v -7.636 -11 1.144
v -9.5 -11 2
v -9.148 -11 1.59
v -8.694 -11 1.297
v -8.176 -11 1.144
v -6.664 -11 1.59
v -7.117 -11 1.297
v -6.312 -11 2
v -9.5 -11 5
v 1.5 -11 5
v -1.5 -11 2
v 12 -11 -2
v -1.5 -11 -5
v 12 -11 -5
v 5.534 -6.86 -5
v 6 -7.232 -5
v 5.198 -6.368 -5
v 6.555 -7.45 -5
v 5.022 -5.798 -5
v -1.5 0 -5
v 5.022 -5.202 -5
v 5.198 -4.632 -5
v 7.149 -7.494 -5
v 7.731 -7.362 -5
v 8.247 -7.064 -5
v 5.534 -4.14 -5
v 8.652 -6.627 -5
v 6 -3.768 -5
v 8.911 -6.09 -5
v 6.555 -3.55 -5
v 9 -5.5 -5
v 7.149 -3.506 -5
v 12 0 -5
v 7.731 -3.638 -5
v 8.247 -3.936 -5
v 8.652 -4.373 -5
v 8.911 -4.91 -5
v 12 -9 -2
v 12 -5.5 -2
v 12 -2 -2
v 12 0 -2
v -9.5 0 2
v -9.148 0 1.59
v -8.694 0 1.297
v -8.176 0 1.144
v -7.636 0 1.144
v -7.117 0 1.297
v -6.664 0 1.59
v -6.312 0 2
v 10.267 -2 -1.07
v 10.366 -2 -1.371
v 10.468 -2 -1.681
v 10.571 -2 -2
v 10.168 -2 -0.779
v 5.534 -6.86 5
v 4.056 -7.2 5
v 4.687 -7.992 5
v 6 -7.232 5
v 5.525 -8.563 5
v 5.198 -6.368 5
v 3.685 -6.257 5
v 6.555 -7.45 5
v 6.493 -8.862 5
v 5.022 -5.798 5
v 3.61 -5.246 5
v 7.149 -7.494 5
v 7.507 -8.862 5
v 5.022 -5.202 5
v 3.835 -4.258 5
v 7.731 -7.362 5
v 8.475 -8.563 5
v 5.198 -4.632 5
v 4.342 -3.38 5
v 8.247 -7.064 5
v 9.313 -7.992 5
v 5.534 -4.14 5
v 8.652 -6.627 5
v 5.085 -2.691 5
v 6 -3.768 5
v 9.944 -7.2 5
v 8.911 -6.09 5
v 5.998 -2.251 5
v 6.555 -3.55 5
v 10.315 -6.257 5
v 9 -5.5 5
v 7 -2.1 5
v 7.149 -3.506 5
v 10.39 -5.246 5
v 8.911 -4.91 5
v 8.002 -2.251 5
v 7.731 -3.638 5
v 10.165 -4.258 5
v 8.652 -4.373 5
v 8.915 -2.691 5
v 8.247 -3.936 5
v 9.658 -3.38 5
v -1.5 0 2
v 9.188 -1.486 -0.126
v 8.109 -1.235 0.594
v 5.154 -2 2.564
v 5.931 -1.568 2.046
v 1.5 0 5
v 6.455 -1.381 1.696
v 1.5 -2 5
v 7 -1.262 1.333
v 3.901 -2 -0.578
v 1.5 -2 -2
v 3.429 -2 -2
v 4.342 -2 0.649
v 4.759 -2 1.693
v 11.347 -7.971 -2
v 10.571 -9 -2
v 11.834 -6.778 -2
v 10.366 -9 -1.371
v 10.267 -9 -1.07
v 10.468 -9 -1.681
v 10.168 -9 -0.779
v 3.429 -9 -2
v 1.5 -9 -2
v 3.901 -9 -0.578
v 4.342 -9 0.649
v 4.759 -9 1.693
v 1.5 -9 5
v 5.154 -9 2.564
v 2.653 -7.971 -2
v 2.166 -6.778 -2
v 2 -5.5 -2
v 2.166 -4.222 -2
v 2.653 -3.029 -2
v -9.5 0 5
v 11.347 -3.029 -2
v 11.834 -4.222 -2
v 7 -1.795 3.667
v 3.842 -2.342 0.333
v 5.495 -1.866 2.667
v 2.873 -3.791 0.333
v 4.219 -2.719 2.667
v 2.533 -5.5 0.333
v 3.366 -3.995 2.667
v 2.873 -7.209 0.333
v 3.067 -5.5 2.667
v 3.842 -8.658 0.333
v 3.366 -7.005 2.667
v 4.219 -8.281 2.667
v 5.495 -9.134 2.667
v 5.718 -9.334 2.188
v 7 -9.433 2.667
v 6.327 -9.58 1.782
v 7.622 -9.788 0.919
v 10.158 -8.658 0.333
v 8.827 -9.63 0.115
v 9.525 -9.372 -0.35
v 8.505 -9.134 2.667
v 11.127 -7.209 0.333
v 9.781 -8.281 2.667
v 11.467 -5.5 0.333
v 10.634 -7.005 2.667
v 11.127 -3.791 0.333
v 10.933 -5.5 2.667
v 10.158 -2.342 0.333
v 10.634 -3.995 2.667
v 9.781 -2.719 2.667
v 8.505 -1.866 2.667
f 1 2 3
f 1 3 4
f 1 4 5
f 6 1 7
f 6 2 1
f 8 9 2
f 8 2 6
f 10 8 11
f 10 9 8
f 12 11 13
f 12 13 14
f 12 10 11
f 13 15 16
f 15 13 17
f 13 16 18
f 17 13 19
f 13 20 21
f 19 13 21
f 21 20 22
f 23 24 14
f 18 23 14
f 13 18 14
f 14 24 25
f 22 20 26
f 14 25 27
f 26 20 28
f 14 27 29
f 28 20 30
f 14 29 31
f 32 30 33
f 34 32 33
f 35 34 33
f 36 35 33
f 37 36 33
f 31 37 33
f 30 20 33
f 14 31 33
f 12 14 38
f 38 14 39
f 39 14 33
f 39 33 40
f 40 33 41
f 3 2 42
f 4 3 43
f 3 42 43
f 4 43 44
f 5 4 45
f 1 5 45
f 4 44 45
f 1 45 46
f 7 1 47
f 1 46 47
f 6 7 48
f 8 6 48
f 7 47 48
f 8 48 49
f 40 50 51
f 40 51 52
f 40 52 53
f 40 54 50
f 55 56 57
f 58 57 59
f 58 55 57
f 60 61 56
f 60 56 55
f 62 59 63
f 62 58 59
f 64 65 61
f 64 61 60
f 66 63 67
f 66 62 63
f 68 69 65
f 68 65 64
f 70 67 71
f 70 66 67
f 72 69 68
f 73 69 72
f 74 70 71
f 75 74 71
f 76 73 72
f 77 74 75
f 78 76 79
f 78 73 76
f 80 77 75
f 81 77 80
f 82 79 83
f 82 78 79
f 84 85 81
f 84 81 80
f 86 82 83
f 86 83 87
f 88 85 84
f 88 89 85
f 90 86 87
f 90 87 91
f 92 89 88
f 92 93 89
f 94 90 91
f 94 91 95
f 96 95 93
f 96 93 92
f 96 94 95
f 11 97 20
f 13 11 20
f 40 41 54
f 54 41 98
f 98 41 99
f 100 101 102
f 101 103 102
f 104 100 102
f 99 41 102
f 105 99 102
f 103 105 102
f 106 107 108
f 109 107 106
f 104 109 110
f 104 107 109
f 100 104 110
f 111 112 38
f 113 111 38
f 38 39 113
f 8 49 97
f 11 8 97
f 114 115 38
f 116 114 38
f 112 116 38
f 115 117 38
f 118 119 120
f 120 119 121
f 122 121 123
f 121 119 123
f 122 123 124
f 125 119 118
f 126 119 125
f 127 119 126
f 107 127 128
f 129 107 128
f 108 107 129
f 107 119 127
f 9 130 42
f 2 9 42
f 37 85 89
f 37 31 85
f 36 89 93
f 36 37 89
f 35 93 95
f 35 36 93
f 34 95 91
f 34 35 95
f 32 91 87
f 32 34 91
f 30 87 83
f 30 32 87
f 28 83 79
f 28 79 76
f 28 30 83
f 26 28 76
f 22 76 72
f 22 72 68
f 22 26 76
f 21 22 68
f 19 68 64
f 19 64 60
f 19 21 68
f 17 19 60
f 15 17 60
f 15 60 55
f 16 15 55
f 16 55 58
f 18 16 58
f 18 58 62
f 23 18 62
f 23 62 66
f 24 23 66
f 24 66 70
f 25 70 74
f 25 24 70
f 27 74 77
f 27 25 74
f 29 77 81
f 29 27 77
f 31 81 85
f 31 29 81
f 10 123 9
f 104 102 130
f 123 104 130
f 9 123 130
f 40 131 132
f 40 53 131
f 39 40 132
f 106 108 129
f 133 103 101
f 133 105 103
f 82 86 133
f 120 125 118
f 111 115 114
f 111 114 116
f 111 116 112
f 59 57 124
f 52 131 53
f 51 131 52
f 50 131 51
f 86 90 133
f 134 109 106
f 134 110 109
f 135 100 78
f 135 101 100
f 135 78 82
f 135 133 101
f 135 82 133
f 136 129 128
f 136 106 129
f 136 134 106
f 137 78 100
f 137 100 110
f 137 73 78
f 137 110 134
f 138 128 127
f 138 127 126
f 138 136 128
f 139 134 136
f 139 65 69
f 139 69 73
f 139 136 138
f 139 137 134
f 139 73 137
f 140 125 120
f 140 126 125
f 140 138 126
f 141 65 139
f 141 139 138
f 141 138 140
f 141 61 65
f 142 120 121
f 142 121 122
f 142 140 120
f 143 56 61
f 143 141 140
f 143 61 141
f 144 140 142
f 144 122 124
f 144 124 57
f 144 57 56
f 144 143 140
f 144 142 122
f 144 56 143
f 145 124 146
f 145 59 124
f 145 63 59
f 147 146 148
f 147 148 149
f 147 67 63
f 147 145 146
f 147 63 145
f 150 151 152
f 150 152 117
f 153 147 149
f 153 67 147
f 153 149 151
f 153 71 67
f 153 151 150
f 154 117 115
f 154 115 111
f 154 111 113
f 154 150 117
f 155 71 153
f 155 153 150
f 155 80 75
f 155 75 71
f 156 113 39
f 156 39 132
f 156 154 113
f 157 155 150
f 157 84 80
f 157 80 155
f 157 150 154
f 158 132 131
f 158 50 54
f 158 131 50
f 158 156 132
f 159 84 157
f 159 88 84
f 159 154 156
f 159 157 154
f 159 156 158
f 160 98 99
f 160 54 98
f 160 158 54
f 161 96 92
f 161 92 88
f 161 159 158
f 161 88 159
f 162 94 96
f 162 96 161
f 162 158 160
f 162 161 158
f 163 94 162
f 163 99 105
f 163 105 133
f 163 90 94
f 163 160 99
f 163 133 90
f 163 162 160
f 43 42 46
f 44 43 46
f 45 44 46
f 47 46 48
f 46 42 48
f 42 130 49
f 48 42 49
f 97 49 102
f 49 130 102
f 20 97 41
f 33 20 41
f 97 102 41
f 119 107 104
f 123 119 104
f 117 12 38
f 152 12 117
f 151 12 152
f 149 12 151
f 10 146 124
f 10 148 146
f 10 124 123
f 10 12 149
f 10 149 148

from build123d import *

# Parameters (mm, degrees)
F0_W     = 10.5
F0_H     = 3
F1_DEPTH = 11
F2_DEPTH = 2
F4_DEPTH = 2
F5_R     = 2
F6_DEPTH = 25
F7_R     = 3.4
F7_R_2   = 2
F8_DEPTH = 7


with BuildPart() as f1:
    # F0 (on Front) → F1 (new body)
    with BuildSketch(Plane.XZ):
        with Locations((6.75, -3.5)):
            Rectangle(F0_W, F0_H)
        with BuildLine():
            Line((1.5, 4), (1.5, 5))
            Line((1.5, 5), (-9.5, 5))
            Line((-9.5, 5), (-9.5, 2))
            ThreePointArc((-9.5, 2), (-7.9057595357, 1.1241546177), (-6.3115190715, 2))
            Line((-6.3115190715, 2), (-1.5, 2))
            Line((-1.5, 2), (-1.5, -4))
            Line((-1.5, -4), (-1.5, -5))
            Line((-1.5, -5), (1.5, -5))
            Line((1.5, -5), (1.5, -2))
            Line((1.5, -2), (1.5, 4))
        make_face()
    extrude(amount=F1_DEPTH)

    # F0 (on Front) → F2 (join)
    with BuildSketch(Plane.XZ):
        Polygon((12, -2), (1.5, 5), (1.5, 4), (1.5, -2), align=None)
    extrude(amount=F2_DEPTH)

    # F3 (on face) → F4 (join)
    with BuildSketch(Plane.XZ.offset(11)):
        Polygon((1.5, -2), (12, -2), (1.5, 5), align=None)
    extrude(amount=-F4_DEPTH)

    # F5 (on face) → F6 (cut)
    with BuildSketch(Plane(origin=(0, 0, -5), x_dir=(1, 0, 0), z_dir=(0, 0, -1))):
        with Locations((7.0000002161, 5.5)):
            Circle(F5_R)
    extrude(amount=-F6_DEPTH, mode=Mode.SUBTRACT)

    # F7 (on face) → F8 (join)
    with BuildSketch(Plane.XY.offset(-2)):
        with Locations((7.0000002161, -5.5)):
            Circle(F7_R)
        with Locations((7.0000002161, -5.5)):
            Circle(F7_R_2, mode=Mode.SUBTRACT)
    extrude(amount=F8_DEPTH)

    # F10 (on offset) → F11 (revolve)
    with BuildSketch(Plane.YZ.offset(7)):
        Polygon((-2.1, 5), (-2.1, -2), (-2, -2), (-0.5000002161, -2), align=None)
    revolve(axis=Axis((7, -5.5, 1.7165149804), (0, 0, 1)))


solid = f1.part
